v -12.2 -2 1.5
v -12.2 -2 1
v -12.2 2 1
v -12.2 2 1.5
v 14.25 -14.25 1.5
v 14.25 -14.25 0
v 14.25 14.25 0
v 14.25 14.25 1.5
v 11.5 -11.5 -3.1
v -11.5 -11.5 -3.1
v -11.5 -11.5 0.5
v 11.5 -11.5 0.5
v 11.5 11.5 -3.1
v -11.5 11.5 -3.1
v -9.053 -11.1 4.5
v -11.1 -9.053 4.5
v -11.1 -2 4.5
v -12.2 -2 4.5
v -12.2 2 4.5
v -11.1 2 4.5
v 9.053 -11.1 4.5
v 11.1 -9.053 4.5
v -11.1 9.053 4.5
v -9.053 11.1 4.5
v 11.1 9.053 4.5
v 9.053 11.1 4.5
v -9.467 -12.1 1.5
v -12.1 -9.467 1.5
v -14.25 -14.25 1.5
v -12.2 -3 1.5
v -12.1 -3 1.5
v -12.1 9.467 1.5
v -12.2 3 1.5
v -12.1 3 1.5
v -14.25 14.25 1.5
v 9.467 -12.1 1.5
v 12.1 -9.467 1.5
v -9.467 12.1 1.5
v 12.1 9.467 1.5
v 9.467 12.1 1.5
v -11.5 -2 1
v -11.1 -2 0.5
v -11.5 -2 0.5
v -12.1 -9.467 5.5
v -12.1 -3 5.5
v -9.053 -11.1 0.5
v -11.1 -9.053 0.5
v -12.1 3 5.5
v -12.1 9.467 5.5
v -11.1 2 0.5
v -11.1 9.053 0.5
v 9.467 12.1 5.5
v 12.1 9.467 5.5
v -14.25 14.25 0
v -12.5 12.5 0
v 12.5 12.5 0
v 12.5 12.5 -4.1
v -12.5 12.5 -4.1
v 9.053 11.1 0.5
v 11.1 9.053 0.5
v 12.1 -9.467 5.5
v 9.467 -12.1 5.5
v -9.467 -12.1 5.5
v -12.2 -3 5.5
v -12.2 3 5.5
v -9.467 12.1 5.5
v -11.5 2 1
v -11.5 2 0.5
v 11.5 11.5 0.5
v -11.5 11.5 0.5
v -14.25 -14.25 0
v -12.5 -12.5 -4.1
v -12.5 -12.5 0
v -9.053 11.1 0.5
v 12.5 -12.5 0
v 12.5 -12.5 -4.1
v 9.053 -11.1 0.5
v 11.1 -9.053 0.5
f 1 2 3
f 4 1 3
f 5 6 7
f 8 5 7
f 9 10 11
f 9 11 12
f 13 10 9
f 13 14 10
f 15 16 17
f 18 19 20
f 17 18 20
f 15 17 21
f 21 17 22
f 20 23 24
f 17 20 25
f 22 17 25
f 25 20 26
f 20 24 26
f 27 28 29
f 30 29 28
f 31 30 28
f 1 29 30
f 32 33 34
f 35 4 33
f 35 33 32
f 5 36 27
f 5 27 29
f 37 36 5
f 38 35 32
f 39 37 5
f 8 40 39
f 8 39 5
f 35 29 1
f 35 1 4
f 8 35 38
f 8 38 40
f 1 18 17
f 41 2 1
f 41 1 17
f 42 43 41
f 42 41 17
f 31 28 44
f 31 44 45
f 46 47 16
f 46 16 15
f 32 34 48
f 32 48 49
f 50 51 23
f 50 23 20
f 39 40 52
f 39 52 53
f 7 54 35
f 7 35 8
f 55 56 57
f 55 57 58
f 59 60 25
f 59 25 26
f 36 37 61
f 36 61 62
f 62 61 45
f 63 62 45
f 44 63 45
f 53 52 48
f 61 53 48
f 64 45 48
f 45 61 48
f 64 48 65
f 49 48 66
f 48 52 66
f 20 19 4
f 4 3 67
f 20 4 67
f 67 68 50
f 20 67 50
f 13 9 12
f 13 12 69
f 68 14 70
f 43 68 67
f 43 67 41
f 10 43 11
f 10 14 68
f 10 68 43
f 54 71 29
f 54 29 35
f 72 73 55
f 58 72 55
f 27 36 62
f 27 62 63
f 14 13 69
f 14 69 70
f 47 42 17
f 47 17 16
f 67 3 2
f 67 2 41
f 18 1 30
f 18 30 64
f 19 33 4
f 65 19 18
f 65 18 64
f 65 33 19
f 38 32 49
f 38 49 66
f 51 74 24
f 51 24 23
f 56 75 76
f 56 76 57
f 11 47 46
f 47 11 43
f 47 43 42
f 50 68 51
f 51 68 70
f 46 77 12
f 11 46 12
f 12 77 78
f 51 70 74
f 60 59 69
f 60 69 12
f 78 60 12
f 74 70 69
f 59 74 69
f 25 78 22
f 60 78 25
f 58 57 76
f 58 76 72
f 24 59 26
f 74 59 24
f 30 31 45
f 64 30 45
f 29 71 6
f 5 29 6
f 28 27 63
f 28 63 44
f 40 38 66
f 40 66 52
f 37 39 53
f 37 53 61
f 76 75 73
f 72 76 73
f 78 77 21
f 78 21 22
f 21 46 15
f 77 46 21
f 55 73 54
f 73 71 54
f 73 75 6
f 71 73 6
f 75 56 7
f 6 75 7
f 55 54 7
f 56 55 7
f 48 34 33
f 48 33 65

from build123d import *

# Parameters (mm, degrees)
CROQUIS1_W              = 28.5
CROQUIS1_H              = 28.5
SALIENTE_EXTRUIR1_DEPTH = 1.5
SALIENTE_EXTRUIR2_DEPTH = 4
CROQUIS3_W              = 25
CROQUIS3_H              = 25
SALIENTE_EXTRUIR3_DEPTH = 4.1
CROQUIS4_W              = 4
CROQUIS4_H              = 6
SALIENTE_EXTRUIR4_DEPTH = 0.1
VACIADO2_START          = -3.1
VACIADO2_DEPTH          = 7.6
VACIADO2_2_DEPTH        = 3.6
VACIADO2_START_2        = 1
VACIADO2_3_OUTLINE_W    = 0.7
VACIADO2_3_OUTLINE_H    = 4
VACIADO2_3_DEPTH        = 3.5


# Read off the part's stored shape, not the designer's step: Vaciado2
with BuildPart() as part:
    # Croquis1 → Saliente-Extruir1 (new body)
    with BuildSketch(Plane.XY):
        Rectangle(CROQUIS1_W, CROQUIS1_H)
    extrude(amount=SALIENTE_EXTRUIR1_DEPTH)

    # Croquis2 → Saliente-Extruir2 (add)
    with BuildSketch(Plane.XY.offset(1.5)):
        Polygon((-12.1, 9.466756826), (-9.466756826, 12.1), (9.466756826, 12.1), (12.1, 9.466756826), (12.1, -9.466756826), (9.466756826, -12.1), (-9.466756826, -12.1), (-12.1, -9.466756826), align=None)
    extrude(amount=SALIENTE_EXTRUIR2_DEPTH)

    # Croquis3 → Saliente-Extruir3 (add)
    with BuildSketch(Plane(origin=(0, 0, 0), x_dir=(-1, 0, 0), z_dir=(0, 0, -1))):
        Rectangle(CROQUIS3_W, CROQUIS3_H)
    extrude(amount=SALIENTE_EXTRUIR3_DEPTH)

    # Croquis4 → Saliente-Extruir4 (add)
    with BuildSketch(Plane.ZY.offset(12.1)):
        with Locations((3.5, 0)):
            Rectangle(CROQUIS4_W, CROQUIS4_H)
    extrude(amount=SALIENTE_EXTRUIR4_DEPTH)

    # Vaciado2 outline → Vaciado2 (cut)
    with BuildSketch(Plane.XY.offset(VACIADO2_START)):
        Polygon((-11.1, 2), (-11.5, 2), (-11.5, -2), (-11.1, -2), (-11.1, -9.052543264), (-9.052543264, -11.1), (9.052543264, -11.1), (11.1, -9.052543264), (11.1, 9.052543264), (9.052543264, 11.1), (-9.052543264, 11.1), (-11.1, 9.052543264), align=None)
    extrude(amount=VACIADO2_DEPTH, mode=Mode.SUBTRACT)

    # Vaciado2 2 outline → Vaciado2 2 (cut)
    with BuildSketch(Plane.XY.offset(VACIADO2_START)):
        Polygon((-11.5, 11.5), (-11.5, 2), (-11.1, 2), (-11.1, 9.052543264), (-9.052543264, 11.1), (9.052543264, 11.1), (11.1, 9.052543264), (11.1, -9.052543264), (9.052543264, -11.1), (-9.052543264, -11.1), (-11.1, -9.052543264), (-11.1, -2), (-11.5, -2), (-11.5, -11.5), (11.5, -11.5), (11.5, 11.5), align=None)
    extrude(amount=VACIADO2_2_DEPTH, mode=Mode.SUBTRACT)

    # Vaciado2 3 outline → Vaciado2 3 (cut)
    with BuildSketch(Plane.XY.offset(VACIADO2_START_2)):
        with Locations((-11.85, 0)):
            Rectangle(VACIADO2_3_OUTLINE_W, VACIADO2_3_OUTLINE_H)
    extrude(amount=VACIADO2_3_DEPTH, mode=Mode.SUBTRACT)


solid = part.part
